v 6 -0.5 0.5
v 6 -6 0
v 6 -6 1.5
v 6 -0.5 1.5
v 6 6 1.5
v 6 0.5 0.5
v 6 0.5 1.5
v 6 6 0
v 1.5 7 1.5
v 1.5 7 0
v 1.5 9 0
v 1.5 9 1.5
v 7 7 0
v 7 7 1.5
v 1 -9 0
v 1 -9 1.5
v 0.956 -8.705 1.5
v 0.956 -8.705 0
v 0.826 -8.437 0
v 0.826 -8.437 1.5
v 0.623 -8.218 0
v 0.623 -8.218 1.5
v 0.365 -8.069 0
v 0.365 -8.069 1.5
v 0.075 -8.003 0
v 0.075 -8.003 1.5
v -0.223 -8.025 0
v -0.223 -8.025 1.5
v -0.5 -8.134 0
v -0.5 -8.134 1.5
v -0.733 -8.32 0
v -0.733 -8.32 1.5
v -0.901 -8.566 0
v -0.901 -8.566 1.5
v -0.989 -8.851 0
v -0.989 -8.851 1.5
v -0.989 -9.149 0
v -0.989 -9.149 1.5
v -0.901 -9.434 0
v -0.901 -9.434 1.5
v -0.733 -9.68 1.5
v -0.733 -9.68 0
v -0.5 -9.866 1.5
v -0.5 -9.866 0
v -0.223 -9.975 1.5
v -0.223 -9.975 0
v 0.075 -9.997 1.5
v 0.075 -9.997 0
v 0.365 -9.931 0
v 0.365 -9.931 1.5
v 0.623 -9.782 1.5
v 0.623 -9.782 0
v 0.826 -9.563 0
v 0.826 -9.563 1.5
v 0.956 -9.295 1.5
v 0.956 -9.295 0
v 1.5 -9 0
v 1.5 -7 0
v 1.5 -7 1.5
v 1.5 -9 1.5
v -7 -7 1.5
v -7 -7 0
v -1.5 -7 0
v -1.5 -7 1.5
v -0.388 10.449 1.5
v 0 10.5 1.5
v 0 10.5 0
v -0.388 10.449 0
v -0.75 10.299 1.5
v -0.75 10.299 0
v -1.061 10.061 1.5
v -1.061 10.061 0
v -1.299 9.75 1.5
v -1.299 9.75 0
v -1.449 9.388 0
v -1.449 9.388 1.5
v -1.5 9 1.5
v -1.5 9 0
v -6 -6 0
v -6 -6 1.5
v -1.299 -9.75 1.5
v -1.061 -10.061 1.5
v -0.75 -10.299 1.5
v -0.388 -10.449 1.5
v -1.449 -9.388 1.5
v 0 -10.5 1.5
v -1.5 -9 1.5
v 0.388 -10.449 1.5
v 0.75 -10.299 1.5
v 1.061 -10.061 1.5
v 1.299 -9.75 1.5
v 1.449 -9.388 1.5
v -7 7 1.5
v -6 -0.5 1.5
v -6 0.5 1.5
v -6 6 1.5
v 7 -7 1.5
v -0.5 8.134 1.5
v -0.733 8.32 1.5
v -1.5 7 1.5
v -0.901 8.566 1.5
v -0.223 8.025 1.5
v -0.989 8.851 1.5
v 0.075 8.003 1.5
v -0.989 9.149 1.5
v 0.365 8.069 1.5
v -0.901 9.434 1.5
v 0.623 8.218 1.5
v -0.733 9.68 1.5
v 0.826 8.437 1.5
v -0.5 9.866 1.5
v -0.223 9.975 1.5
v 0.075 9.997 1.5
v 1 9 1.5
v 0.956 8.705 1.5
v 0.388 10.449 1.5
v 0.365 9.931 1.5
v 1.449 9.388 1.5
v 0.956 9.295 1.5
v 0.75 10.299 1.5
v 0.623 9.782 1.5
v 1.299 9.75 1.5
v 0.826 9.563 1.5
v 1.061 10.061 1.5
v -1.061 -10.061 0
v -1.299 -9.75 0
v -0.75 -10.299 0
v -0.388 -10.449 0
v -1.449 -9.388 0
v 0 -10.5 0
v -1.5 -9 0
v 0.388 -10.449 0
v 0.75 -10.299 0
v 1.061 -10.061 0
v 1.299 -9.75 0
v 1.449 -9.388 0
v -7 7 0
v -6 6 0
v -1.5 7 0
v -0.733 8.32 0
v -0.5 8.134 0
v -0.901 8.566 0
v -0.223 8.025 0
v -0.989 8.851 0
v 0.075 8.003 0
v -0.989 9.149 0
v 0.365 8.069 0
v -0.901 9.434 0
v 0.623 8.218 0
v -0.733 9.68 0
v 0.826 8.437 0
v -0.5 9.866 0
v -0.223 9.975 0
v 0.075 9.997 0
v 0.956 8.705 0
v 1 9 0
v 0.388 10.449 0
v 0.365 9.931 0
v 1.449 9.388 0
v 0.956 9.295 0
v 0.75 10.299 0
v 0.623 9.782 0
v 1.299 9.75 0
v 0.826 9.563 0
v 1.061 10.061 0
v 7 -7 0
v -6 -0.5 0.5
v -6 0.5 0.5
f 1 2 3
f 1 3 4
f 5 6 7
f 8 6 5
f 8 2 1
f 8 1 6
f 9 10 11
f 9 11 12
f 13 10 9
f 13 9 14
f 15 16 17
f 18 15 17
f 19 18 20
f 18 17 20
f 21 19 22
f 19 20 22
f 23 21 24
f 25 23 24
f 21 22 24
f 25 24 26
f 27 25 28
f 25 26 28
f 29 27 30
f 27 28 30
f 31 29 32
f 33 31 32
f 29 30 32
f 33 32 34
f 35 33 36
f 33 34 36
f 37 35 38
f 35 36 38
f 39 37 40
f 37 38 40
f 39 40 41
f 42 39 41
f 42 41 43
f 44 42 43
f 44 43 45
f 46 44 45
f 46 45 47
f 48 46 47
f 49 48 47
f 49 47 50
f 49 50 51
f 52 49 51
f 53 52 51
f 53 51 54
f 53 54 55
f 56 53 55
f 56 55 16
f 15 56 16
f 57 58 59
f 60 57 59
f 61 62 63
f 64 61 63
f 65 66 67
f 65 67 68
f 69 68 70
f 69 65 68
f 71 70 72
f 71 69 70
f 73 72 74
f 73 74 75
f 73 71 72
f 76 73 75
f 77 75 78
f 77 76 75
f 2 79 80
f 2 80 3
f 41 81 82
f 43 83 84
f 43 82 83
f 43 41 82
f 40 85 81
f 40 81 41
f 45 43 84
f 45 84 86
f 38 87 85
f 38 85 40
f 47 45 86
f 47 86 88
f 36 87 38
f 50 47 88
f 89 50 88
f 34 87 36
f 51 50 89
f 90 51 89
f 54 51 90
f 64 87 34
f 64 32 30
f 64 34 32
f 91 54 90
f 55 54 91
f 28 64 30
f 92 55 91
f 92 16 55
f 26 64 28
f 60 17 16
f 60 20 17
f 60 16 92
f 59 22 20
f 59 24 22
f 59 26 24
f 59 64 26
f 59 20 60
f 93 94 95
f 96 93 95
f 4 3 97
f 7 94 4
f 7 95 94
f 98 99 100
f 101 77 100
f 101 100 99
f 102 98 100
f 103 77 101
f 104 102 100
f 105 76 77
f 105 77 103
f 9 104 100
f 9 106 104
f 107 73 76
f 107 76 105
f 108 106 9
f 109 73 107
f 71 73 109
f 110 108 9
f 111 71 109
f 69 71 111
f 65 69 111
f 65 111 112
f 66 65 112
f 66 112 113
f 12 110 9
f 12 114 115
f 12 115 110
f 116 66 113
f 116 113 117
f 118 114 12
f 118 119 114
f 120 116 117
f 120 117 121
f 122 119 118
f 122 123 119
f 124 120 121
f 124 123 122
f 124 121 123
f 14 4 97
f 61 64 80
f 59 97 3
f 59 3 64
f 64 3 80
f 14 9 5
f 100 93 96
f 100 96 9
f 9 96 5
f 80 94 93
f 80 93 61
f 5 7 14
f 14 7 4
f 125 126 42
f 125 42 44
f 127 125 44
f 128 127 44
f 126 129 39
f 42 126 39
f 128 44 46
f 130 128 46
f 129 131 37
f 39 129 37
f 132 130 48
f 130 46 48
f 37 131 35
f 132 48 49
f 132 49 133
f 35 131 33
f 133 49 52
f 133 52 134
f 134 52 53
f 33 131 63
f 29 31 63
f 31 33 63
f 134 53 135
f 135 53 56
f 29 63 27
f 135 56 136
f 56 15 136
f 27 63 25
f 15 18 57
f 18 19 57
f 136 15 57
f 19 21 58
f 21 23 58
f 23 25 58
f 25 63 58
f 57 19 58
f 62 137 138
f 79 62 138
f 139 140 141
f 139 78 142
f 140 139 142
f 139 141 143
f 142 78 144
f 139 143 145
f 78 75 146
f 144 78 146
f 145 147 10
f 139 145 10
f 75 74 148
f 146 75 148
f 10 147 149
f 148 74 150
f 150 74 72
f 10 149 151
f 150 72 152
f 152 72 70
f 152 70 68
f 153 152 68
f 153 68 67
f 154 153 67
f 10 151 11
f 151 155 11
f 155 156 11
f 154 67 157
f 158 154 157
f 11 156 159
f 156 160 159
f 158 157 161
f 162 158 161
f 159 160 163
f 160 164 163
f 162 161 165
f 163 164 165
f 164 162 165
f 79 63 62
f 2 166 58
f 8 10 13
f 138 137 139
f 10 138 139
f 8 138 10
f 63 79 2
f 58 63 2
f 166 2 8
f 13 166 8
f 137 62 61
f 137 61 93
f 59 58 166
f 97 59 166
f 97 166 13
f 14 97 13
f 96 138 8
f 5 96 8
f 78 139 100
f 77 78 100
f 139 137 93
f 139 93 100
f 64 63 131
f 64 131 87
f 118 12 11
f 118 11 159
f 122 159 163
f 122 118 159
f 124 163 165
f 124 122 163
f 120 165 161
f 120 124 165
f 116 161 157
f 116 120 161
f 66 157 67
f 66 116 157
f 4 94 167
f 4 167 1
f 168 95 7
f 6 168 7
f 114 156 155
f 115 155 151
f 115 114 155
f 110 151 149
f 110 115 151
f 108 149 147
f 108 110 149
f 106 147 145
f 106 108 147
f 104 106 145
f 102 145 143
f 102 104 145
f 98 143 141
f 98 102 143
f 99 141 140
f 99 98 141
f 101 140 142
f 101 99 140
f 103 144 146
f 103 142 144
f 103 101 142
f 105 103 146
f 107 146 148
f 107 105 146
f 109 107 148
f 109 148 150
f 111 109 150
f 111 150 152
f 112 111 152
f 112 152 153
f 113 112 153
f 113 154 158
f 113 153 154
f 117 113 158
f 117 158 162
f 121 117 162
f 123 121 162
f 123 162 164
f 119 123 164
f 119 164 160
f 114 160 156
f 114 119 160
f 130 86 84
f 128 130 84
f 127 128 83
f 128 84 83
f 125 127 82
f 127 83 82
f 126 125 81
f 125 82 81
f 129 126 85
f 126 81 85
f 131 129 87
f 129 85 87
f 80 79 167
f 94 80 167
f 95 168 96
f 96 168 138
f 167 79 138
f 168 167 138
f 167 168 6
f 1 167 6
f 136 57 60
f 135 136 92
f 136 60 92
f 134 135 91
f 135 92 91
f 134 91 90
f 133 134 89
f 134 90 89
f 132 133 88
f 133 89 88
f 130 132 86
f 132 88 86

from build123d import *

# Parameters (mm, degrees)
SKETCH_6_W          = 14
SKETCH_6_H          = 14
SKETCH_6_W_2        = 12
SKETCH_6_H_2        = 12
EXTRUDE_3_DEPTH     = 1.5
SKETCH_7_W          = 3
SKETCH_7_H          = 1.5
EXTRUDE_4_DEPTH     = 3.5
CUT_EXTRUDE_3_DEPTH = 4
SKETCH_11_R         = 1
CUT_EXTRUDE_5_DEPTH = 4
SKETCH_12_W         = 12
SKETCH_12_H         = 1
EXTRUDE_5_DEPTH     = 1


with BuildPart() as part:
    # 草图6 → 凸台-拉伸3 (new body)
    with BuildSketch(Plane.XY):
        Rectangle(SKETCH_6_W, SKETCH_6_H)
        Rectangle(SKETCH_6_W_2, SKETCH_6_H_2, mode=Mode.SUBTRACT)
    extrude(amount=EXTRUDE_3_DEPTH)

    # 草图7 → 凸台-拉伸4 (add)
    with BuildSketch(Plane.XZ.offset(7)):
        with Locations((0, 0.75)):
            Rectangle(SKETCH_7_W, SKETCH_7_H)
    extrude_4 = extrude(amount=EXTRUDE_4_DEPTH)

    # 草图8 → 切除-拉伸3 (cut)
    with BuildSketch(Plane.XY.offset(1.5)):
        with BuildLine():
            ThreePointArc((0, -10.5), (-1.060660172, -10.060660172), (-1.5, -9))
            Line((-1.5, -9), (-1.5, -10.5))
            Line((-1.5, -10.5), (0, -10.5))
        make_face()
        with BuildLine():
            Line((1.5, -10.5), (1.5, -9))
            ThreePointArc((1.5, -9), (1.060660172, -10.060660172), (0, -10.5))
            Line((0, -10.5), (1.5, -10.5))
        make_face()
    cut_extrude_3 = extrude(amount=-CUT_EXTRUDE_3_DEPTH, mode=Mode.SUBTRACT)

    # 草图11 → 切除-拉伸5 (cut)
    with BuildSketch(Plane.XY.offset(1.5)):
        with Locations((0, -9)):
            Circle(SKETCH_11_R)
    cut_extrude_5 = extrude(amount=-CUT_EXTRUDE_5_DEPTH, mode=Mode.SUBTRACT)

    # 镜向1: 凸台-拉伸4, 切除-拉伸3, 切除-拉伸5 across plane
    add(extrude_4.mirror(Plane.ZX))
    add(cut_extrude_3.mirror(Plane.ZX), mode=Mode.SUBTRACT)
    add(cut_extrude_5.mirror(Plane.ZX), mode=Mode.SUBTRACT)

    # 草图12 → 凸台-拉伸5 (add)
    with BuildSketch(Plane.XY.offset(1.5)):
        Rectangle(SKETCH_12_W, SKETCH_12_H)
    extrude(amount=-EXTRUDE_5_DEPTH)


solid = part.part
